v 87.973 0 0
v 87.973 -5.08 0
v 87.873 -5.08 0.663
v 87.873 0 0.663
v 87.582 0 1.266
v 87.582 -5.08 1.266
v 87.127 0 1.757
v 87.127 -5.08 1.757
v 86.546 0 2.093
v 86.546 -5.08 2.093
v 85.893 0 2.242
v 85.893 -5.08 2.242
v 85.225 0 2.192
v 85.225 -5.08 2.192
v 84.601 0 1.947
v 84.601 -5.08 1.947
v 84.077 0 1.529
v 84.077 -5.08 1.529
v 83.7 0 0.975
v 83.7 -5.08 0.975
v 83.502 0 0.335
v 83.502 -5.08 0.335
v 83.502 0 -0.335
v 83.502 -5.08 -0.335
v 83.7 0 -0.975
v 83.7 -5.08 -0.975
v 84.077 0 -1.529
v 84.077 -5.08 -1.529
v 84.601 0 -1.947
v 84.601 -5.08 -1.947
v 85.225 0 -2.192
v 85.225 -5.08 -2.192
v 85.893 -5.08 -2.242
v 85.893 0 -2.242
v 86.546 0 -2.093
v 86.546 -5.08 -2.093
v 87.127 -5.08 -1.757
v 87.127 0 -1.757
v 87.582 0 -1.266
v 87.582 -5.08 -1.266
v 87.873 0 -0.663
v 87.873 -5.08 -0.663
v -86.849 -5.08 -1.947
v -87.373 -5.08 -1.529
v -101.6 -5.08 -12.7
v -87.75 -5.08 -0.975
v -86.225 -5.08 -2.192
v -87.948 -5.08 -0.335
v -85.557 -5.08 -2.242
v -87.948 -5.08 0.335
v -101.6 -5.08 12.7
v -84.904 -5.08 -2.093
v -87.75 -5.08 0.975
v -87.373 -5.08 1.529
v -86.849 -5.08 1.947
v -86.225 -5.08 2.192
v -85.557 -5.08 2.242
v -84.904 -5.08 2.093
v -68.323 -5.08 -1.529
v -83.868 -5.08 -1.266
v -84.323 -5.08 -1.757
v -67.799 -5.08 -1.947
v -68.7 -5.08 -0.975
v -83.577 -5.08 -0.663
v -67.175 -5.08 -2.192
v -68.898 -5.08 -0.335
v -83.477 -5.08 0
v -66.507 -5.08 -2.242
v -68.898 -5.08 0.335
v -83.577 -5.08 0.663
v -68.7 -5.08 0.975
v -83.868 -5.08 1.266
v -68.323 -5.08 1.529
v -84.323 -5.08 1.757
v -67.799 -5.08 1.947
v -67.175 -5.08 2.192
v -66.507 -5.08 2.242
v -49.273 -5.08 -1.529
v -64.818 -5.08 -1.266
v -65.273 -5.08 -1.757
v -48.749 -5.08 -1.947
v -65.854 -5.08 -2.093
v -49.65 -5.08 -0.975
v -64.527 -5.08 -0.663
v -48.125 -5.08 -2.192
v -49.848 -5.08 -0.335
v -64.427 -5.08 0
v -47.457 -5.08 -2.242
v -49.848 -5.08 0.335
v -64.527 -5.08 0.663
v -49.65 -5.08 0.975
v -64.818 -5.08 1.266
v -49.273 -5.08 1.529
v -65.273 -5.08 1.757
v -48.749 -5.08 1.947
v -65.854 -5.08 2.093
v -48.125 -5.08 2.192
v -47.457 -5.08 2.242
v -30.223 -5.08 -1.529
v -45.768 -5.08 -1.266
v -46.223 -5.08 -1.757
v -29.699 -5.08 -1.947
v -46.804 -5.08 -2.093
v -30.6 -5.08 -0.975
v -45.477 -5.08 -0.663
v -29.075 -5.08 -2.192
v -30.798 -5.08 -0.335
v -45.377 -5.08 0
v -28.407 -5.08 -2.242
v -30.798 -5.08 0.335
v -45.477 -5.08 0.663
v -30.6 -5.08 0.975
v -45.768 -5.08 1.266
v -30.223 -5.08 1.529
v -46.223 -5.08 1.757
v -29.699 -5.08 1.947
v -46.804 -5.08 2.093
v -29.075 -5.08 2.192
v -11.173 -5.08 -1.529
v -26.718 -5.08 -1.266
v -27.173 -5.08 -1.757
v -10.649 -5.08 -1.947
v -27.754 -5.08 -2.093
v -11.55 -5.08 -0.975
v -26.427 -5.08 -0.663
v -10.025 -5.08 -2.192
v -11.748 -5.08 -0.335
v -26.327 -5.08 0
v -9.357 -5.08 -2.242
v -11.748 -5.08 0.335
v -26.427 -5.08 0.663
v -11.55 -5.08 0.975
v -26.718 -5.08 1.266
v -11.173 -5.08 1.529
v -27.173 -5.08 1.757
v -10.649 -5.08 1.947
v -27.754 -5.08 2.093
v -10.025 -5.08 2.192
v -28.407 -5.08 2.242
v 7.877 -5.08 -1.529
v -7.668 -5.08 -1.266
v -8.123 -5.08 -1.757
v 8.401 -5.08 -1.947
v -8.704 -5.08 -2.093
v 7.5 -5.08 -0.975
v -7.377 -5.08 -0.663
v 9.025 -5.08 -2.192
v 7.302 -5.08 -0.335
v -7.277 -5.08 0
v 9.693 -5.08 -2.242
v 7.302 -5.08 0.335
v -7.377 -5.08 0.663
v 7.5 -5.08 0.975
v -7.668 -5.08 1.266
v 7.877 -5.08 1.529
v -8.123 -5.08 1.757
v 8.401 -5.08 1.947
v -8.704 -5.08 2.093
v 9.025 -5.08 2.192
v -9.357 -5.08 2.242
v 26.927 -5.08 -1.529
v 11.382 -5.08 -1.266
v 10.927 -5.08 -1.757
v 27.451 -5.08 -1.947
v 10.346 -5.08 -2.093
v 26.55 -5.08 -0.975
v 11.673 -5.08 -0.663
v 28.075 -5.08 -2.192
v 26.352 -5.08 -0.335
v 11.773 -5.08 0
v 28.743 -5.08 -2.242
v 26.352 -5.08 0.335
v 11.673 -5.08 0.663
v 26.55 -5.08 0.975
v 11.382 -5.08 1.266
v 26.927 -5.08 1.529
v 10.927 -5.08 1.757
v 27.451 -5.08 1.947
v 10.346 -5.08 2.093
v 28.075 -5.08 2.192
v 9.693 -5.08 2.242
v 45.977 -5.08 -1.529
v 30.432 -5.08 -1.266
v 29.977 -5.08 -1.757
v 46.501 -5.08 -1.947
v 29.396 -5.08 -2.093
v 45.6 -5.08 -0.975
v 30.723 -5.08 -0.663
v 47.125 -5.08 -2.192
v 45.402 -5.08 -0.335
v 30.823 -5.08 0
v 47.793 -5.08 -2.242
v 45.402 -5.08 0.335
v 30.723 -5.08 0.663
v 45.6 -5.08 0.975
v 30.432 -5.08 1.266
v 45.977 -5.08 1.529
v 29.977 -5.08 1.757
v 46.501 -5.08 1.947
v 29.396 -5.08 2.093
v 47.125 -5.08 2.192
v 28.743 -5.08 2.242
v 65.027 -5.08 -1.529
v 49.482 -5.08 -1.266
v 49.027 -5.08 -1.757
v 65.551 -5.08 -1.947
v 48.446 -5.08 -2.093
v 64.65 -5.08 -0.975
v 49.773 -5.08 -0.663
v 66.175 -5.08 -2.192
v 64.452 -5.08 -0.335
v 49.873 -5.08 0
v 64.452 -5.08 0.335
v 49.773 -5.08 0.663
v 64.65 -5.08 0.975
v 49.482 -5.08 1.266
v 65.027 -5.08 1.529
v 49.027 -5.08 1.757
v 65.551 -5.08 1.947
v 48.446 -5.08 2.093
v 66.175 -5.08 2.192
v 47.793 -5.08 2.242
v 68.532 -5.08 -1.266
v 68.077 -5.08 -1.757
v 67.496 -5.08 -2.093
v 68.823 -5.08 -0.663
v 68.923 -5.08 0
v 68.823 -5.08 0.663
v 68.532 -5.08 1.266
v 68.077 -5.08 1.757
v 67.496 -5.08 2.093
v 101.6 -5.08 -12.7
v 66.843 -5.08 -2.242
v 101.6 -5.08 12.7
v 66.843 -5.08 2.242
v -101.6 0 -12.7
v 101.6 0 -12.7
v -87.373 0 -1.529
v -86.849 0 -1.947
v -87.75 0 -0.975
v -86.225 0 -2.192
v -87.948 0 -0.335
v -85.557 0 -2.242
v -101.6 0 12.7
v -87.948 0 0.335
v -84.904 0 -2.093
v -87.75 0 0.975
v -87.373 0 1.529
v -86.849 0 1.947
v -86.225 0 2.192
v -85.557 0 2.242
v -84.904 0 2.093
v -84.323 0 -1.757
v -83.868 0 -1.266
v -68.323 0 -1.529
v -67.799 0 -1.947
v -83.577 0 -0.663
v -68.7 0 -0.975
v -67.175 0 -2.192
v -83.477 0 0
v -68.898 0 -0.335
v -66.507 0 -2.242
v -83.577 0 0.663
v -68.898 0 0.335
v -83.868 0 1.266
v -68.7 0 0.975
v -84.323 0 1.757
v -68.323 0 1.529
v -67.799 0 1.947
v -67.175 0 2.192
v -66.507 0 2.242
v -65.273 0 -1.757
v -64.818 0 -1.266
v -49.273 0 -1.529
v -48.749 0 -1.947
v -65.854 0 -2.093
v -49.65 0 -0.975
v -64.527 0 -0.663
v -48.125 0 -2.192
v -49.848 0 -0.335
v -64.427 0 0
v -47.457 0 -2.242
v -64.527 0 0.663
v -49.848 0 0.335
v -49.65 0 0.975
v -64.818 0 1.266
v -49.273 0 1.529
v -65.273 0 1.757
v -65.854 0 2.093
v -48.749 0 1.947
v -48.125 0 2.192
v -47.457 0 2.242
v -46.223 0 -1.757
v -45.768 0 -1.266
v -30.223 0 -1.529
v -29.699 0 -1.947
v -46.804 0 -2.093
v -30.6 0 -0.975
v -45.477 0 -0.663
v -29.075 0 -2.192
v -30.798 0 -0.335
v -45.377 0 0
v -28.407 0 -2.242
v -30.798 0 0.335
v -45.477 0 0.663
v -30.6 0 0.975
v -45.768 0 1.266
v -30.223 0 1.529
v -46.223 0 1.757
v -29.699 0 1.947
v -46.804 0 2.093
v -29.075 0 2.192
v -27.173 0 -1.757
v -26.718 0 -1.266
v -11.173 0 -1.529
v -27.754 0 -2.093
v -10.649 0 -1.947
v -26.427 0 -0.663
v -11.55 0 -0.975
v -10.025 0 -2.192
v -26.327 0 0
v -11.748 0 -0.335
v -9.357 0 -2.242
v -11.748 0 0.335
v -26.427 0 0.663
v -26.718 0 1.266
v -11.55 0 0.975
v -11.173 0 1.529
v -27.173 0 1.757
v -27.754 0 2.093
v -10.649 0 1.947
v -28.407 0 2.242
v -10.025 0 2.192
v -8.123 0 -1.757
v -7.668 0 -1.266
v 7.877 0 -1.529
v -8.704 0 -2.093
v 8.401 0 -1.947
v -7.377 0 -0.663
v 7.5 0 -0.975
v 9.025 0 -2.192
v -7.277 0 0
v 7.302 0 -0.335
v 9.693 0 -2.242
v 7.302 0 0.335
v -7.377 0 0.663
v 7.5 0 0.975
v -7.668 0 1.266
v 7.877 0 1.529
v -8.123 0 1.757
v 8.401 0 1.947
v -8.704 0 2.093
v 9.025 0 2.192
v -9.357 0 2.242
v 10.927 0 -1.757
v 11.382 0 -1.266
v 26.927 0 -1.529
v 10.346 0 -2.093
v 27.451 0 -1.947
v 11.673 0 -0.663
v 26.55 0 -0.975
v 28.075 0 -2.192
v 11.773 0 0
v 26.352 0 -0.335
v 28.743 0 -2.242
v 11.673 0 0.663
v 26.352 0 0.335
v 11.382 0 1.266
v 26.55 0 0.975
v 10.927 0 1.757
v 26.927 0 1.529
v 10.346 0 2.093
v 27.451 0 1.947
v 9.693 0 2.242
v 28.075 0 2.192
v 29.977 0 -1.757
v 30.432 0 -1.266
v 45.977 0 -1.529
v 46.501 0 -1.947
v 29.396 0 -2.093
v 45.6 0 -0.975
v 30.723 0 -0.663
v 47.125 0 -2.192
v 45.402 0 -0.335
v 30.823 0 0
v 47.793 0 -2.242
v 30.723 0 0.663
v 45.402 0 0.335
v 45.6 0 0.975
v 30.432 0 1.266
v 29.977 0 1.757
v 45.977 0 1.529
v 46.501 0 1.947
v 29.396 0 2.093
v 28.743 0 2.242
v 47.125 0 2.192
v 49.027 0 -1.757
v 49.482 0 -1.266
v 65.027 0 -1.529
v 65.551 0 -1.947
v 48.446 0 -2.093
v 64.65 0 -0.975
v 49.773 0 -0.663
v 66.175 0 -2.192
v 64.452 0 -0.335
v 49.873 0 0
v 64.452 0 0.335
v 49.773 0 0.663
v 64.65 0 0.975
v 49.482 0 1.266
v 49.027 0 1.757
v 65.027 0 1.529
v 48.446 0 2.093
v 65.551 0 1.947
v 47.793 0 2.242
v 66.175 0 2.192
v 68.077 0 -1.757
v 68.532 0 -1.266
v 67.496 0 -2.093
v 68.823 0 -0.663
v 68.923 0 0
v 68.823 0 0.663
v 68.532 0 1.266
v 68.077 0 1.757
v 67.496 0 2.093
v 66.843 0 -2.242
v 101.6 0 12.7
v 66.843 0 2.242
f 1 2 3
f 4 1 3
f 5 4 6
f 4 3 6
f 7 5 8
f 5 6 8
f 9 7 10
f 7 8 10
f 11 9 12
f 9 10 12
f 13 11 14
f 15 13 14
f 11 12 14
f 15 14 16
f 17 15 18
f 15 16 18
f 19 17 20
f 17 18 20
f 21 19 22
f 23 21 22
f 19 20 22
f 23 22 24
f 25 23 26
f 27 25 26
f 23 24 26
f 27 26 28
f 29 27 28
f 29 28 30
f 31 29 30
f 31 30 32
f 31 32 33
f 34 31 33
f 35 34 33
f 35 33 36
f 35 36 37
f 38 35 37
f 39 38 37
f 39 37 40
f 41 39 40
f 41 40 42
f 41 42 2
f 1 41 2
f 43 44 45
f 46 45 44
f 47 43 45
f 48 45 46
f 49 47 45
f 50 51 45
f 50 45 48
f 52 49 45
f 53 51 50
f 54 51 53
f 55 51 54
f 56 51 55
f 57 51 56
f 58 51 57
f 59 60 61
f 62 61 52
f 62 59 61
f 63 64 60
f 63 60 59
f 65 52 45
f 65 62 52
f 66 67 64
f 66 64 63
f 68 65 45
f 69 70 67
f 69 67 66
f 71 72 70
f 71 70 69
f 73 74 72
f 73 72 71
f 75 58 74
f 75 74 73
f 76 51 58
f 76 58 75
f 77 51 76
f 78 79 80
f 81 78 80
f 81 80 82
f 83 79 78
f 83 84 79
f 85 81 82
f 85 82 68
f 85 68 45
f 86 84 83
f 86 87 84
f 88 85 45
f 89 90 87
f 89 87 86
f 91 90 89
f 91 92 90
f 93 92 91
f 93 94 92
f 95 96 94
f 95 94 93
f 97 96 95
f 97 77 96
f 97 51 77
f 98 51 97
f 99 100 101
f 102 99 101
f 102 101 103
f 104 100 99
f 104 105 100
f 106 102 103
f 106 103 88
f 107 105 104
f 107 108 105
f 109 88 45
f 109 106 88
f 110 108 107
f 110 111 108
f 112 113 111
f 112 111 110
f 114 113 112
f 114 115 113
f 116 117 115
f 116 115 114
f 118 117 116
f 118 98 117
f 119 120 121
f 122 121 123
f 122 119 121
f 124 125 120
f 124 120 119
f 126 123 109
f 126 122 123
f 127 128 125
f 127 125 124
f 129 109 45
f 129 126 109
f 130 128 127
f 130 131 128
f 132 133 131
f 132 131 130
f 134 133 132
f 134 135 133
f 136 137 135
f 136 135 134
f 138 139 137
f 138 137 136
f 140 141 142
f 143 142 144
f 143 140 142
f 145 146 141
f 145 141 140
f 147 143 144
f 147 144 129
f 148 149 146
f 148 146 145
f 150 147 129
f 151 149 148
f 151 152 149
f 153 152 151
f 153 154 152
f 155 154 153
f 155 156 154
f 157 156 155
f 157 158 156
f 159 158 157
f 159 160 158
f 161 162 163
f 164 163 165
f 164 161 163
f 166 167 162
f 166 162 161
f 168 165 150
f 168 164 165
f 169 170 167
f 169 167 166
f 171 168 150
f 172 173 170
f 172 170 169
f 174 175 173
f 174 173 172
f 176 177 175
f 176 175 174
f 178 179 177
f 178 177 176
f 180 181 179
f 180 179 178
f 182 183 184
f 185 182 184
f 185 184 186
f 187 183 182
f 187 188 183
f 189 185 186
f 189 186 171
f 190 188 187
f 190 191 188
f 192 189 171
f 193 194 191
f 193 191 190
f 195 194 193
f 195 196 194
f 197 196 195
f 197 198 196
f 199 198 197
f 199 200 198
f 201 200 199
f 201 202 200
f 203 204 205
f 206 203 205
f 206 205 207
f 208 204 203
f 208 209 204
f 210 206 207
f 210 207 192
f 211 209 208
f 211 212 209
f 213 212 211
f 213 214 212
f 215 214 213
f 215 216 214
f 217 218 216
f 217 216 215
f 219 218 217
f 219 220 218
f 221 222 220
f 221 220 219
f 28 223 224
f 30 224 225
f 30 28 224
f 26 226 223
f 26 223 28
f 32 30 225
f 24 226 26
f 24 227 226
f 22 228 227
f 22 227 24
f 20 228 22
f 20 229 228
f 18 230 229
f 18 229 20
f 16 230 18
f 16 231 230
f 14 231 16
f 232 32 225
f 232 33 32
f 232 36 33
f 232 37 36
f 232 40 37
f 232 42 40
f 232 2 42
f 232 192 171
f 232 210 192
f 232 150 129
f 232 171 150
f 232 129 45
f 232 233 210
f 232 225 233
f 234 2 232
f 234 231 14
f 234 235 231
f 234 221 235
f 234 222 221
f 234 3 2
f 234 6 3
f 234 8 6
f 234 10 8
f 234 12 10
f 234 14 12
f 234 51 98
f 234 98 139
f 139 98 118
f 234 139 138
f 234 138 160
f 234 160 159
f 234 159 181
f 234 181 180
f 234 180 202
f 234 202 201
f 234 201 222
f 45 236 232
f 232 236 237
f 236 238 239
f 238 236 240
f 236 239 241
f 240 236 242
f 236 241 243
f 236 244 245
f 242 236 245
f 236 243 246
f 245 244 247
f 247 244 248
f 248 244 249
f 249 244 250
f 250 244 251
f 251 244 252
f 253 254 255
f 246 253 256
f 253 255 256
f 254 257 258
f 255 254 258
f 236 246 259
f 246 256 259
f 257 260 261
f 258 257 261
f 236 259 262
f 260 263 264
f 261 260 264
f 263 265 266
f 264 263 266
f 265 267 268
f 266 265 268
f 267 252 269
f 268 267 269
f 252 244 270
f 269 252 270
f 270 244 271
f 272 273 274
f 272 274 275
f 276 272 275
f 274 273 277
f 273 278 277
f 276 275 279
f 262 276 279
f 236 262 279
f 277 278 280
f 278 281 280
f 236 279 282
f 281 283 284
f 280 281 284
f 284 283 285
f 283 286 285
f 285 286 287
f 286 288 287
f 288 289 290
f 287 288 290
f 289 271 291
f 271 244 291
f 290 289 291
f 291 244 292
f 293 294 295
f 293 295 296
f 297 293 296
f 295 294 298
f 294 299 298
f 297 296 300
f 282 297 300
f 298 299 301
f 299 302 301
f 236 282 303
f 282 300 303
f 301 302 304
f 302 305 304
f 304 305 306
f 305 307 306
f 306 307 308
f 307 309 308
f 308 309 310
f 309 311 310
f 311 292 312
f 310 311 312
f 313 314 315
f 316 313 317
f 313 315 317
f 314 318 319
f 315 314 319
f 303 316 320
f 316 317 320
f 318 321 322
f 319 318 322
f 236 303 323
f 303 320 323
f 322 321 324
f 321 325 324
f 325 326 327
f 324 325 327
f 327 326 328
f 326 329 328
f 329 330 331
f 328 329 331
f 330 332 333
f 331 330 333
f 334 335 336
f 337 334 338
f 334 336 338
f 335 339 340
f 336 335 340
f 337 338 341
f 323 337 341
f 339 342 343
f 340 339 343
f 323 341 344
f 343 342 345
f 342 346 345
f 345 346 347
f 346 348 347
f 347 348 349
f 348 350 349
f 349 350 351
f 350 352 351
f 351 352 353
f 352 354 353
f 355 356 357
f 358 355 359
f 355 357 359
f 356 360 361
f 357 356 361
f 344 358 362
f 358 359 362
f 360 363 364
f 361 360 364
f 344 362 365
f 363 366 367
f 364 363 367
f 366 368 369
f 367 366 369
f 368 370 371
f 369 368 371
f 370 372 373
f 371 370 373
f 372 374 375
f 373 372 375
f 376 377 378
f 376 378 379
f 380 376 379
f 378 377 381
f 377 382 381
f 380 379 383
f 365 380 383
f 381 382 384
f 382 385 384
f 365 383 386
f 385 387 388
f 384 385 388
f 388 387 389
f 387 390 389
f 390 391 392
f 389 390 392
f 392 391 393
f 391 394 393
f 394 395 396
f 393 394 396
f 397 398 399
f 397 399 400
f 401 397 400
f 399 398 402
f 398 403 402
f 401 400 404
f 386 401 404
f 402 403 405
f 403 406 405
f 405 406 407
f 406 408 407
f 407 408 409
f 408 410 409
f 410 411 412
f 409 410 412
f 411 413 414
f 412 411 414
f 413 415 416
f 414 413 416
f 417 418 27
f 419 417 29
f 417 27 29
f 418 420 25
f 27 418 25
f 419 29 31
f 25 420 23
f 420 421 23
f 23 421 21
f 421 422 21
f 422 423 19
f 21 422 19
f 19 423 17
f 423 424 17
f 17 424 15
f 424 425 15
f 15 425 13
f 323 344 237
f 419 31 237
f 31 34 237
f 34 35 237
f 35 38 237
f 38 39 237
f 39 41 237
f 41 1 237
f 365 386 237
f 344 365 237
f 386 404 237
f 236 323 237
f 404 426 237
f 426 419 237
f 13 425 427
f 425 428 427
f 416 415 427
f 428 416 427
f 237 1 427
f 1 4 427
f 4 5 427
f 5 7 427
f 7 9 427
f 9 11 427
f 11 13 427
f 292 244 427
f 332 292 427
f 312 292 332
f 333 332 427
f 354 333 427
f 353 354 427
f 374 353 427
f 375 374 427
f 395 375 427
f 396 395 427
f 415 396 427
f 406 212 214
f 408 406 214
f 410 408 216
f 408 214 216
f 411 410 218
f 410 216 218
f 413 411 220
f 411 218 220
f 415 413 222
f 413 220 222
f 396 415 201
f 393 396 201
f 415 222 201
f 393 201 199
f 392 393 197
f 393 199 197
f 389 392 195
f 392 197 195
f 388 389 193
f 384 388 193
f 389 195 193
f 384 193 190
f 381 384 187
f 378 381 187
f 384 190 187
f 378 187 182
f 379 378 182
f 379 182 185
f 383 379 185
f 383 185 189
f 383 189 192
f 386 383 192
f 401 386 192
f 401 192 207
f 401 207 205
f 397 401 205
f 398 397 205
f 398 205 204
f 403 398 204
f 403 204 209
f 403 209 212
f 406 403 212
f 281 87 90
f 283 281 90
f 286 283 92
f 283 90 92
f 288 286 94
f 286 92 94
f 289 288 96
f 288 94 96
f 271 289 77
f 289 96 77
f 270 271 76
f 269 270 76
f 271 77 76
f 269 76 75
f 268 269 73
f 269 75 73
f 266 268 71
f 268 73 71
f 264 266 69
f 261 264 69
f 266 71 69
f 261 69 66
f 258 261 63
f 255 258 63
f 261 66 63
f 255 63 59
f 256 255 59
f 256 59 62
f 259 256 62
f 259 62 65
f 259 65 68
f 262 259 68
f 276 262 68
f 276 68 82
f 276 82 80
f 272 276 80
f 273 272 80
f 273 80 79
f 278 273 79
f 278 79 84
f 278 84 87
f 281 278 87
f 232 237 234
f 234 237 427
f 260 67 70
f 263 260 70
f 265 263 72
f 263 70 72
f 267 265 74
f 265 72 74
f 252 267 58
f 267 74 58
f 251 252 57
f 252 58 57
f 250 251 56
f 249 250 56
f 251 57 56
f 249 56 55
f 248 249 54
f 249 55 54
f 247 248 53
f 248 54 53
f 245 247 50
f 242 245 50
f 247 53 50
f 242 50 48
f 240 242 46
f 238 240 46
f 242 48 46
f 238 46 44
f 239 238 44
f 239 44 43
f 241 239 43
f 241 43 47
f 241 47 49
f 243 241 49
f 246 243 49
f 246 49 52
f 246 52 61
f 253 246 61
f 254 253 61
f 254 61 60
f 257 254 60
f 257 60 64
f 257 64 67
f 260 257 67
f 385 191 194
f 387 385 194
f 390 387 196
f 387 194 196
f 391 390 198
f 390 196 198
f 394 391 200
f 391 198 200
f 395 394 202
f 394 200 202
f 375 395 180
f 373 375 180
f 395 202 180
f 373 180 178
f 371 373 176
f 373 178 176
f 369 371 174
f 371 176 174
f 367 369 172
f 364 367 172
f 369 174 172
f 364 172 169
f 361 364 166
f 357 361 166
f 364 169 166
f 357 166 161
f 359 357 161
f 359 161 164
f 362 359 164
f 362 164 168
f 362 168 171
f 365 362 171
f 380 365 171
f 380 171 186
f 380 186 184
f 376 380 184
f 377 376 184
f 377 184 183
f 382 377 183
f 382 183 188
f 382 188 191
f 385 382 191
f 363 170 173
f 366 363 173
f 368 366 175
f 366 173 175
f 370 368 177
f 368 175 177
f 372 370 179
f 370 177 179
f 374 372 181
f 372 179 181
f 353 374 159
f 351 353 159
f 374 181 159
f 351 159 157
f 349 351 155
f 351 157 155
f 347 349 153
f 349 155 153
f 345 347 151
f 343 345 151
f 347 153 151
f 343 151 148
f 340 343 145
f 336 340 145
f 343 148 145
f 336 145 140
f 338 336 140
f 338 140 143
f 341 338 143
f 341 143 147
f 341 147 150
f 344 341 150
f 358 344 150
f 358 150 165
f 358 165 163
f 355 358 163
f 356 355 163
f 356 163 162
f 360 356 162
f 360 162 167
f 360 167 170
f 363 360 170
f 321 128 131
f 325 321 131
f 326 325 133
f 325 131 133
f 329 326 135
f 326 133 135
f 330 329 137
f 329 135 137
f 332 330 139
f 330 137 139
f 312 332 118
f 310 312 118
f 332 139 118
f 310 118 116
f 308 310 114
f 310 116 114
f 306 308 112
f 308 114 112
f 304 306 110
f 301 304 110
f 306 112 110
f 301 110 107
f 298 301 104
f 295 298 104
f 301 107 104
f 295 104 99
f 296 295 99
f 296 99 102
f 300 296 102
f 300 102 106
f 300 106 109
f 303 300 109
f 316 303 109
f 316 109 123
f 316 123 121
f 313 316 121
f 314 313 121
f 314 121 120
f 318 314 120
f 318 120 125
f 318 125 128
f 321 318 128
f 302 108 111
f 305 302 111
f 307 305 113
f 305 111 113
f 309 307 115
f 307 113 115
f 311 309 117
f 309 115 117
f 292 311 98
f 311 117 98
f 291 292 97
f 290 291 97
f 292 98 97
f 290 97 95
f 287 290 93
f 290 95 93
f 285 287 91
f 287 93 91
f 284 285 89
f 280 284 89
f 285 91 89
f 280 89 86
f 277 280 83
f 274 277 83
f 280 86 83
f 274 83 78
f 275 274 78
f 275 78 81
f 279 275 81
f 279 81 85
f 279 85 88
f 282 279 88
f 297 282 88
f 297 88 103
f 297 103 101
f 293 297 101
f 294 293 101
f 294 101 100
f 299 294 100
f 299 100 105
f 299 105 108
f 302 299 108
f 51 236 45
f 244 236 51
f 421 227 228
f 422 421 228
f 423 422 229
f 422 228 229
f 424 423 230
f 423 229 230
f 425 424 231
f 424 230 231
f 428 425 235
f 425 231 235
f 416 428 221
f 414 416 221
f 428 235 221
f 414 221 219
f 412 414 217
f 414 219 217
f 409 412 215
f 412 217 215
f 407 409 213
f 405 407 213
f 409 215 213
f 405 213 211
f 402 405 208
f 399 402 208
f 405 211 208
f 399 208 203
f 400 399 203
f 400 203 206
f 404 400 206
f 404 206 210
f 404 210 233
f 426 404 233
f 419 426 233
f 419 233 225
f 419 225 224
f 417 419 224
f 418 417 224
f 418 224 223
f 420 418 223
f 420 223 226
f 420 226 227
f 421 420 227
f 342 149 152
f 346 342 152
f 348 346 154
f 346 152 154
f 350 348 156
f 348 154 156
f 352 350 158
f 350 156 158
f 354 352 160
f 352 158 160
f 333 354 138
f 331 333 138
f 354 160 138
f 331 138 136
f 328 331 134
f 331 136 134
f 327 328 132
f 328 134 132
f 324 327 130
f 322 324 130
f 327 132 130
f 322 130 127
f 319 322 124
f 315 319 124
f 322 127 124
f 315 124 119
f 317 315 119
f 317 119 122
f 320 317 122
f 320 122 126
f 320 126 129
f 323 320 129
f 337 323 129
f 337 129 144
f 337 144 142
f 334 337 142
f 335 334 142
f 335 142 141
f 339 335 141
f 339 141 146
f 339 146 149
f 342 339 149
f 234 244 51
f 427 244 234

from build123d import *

# Parameters (mm, degrees)
F0_W     = 203.2
F0_H     = 25.4
F1_DEPTH = 5.08
F2_R     = 2.2479
F3_DEPTH = 25.4


with BuildPart() as f1:
    # F0 (on Front) → F1 (new body)
    with BuildSketch(Plane.XZ):
        Rectangle(F0_W, F0_H)
    extrude(amount=F1_DEPTH)

    # F2 (on face) → F3 (cut)
    with BuildSketch(Plane.XZ.offset(5.08)):
        with Locations((-85.725, 0)):
            Circle(F2_R)
        with Locations((-66.675, 0)):
            Circle(F2_R)
        with Locations((-47.625, 0)):
            Circle(F2_R)
        with Locations((-28.575, 0)):
            Circle(F2_R)
        with Locations((-9.525, 0)):
            Circle(F2_R)
        with Locations((9.525, 0)):
            Circle(F2_R)
        with Locations((28.575, 0)):
            Circle(F2_R)
        with Locations((47.625, 0)):
            Circle(F2_R)
        with Locations((66.675, 0)):
            Circle(F2_R)
        with Locations((85.725, 0)):
            Circle(F2_R)
    extrude(amount=-F3_DEPTH, mode=Mode.SUBTRACT)


solid = f1.part
